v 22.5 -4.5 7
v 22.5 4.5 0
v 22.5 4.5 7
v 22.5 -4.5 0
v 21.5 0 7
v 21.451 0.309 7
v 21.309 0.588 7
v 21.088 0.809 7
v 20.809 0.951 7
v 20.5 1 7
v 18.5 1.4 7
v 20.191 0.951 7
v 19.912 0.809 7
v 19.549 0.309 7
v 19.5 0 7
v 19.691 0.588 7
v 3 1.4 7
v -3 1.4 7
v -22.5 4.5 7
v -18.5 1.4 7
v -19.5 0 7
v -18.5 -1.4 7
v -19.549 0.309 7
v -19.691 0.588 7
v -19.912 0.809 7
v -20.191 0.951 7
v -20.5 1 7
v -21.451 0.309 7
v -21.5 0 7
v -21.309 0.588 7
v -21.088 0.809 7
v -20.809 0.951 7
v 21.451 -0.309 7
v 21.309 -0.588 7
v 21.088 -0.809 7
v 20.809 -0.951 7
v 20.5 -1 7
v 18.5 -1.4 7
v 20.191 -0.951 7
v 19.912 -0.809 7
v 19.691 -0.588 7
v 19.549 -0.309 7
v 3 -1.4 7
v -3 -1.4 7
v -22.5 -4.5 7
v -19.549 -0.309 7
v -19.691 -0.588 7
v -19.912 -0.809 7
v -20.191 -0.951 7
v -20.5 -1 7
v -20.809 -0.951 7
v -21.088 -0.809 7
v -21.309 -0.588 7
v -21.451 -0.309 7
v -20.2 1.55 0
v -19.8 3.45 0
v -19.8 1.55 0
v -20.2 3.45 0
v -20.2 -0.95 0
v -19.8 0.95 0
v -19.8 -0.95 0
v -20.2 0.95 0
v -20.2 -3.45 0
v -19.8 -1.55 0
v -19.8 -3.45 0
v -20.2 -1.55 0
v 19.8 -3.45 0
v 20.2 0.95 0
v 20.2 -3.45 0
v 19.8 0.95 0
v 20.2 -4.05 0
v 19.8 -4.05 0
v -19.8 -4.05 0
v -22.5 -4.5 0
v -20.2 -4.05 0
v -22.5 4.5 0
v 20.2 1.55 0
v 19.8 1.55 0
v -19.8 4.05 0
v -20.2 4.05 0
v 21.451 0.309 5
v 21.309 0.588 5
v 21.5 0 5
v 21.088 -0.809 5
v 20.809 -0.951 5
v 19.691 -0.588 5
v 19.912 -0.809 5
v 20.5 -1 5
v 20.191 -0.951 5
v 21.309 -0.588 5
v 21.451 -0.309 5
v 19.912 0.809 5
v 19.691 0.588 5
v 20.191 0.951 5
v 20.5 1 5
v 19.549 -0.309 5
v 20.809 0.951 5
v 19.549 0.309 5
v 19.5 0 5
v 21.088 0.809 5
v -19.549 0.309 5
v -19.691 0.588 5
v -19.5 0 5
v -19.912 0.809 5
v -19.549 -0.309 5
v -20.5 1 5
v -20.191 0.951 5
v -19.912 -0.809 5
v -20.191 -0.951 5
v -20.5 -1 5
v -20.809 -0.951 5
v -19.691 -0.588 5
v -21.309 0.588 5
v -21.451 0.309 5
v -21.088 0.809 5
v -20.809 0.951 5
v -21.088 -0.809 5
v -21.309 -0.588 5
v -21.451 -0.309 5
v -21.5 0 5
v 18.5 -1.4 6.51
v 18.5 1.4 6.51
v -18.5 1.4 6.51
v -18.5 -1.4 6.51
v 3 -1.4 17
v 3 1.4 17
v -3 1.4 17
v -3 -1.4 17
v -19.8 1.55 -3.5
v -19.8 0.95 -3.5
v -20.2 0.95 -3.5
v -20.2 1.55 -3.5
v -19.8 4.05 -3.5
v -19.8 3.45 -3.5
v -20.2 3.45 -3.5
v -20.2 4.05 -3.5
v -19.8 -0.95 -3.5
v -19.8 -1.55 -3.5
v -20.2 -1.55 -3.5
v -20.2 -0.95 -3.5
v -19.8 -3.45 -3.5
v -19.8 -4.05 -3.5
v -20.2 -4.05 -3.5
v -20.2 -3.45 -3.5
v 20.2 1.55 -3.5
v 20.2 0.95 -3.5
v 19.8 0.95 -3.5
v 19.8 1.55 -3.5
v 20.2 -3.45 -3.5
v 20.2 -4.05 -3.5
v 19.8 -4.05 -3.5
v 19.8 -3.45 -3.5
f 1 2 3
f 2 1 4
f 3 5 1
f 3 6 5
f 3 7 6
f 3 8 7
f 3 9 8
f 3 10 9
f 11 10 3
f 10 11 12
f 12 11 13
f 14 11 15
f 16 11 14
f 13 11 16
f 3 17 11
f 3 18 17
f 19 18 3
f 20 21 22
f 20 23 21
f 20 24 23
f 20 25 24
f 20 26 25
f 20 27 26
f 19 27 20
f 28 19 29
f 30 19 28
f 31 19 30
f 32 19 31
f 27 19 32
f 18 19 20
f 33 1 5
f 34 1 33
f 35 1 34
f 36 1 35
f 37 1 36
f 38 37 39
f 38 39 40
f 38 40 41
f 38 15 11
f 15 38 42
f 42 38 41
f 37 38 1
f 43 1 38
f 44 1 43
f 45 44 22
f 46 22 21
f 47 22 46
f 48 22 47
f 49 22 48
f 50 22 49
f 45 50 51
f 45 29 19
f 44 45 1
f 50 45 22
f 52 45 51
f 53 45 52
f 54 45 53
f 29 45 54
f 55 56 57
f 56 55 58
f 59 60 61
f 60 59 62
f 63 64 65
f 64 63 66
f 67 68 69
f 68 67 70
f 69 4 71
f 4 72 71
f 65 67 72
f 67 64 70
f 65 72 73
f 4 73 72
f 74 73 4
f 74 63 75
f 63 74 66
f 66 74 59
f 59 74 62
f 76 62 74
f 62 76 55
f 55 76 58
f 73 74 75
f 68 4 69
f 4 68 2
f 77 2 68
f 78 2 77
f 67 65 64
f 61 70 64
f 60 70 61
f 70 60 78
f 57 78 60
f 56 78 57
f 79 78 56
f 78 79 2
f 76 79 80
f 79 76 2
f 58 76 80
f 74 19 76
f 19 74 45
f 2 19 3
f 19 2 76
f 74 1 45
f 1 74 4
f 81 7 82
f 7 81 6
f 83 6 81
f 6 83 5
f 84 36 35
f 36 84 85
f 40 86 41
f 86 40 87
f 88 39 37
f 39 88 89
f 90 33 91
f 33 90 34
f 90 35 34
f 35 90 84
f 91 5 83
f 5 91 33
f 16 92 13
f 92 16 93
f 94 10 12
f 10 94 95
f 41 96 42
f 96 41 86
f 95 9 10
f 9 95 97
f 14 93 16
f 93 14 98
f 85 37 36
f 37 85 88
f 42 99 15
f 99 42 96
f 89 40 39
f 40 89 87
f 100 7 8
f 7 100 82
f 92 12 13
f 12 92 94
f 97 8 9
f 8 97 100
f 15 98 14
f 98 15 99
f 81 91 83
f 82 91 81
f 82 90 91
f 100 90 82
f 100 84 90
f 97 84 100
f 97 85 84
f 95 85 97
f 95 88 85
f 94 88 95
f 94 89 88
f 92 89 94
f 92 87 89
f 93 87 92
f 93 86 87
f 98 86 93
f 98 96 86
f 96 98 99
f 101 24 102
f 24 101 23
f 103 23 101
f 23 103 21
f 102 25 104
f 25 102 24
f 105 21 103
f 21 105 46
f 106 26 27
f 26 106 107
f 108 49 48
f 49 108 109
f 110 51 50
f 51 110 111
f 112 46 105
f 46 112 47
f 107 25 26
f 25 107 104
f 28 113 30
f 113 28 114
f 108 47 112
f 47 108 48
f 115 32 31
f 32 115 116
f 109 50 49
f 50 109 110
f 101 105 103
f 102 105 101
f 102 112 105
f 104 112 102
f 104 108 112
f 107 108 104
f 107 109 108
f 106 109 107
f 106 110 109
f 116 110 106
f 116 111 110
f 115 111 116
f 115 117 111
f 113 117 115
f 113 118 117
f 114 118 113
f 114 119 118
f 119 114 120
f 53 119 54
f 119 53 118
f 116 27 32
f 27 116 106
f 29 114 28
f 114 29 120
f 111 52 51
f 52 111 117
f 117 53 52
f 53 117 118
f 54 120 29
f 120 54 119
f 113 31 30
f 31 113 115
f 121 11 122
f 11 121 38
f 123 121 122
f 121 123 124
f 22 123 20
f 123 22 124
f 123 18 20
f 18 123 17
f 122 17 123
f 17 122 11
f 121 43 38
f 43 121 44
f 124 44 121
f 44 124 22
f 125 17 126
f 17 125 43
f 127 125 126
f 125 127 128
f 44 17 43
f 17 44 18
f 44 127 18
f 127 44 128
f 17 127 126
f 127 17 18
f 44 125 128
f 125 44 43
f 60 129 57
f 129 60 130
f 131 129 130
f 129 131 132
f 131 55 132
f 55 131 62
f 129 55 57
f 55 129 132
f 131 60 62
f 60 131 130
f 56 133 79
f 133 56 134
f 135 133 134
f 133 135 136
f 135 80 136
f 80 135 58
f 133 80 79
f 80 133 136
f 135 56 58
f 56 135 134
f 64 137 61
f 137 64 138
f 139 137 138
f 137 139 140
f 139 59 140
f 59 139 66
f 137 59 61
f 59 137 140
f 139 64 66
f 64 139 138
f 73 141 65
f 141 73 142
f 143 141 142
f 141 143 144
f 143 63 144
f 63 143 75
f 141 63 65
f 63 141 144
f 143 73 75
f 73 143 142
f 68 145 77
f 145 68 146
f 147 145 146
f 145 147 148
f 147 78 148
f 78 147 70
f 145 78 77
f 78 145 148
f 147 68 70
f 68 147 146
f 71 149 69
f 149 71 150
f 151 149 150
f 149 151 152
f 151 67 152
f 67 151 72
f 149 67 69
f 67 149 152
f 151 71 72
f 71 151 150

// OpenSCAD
module pin(x,y) {
    translate([-0.2+x,-0.3+y,-3.5])cube([0.4,0.6,3.5]);
}

module body() {
difference() {
    translate([-22.5, -4.5, 0])color("silver")cube([45, 9, 7]);
    translate([20.5,0,7-2])color("silver")cylinder(r=1,h=2.1,$fn=20);
    translate([-20.5,0,7-2])color("silver")cylinder(r=1,h=2.1,$fn=20);
    translate([-18.5, -1.4, 7-0.49])color("silver")cube([37, 2.8, 0.5]);
}

translate([-3, -1.4, 7])color("black")cube([6, 2.8, 10]);
//+18.5-3

pin(-20,1.25);
pin(-20,3.75);
pin(-20,-1.25);
pin(-20,-3.75);
pin(20,1.25);
pin(20,-3.75);
}

body();
